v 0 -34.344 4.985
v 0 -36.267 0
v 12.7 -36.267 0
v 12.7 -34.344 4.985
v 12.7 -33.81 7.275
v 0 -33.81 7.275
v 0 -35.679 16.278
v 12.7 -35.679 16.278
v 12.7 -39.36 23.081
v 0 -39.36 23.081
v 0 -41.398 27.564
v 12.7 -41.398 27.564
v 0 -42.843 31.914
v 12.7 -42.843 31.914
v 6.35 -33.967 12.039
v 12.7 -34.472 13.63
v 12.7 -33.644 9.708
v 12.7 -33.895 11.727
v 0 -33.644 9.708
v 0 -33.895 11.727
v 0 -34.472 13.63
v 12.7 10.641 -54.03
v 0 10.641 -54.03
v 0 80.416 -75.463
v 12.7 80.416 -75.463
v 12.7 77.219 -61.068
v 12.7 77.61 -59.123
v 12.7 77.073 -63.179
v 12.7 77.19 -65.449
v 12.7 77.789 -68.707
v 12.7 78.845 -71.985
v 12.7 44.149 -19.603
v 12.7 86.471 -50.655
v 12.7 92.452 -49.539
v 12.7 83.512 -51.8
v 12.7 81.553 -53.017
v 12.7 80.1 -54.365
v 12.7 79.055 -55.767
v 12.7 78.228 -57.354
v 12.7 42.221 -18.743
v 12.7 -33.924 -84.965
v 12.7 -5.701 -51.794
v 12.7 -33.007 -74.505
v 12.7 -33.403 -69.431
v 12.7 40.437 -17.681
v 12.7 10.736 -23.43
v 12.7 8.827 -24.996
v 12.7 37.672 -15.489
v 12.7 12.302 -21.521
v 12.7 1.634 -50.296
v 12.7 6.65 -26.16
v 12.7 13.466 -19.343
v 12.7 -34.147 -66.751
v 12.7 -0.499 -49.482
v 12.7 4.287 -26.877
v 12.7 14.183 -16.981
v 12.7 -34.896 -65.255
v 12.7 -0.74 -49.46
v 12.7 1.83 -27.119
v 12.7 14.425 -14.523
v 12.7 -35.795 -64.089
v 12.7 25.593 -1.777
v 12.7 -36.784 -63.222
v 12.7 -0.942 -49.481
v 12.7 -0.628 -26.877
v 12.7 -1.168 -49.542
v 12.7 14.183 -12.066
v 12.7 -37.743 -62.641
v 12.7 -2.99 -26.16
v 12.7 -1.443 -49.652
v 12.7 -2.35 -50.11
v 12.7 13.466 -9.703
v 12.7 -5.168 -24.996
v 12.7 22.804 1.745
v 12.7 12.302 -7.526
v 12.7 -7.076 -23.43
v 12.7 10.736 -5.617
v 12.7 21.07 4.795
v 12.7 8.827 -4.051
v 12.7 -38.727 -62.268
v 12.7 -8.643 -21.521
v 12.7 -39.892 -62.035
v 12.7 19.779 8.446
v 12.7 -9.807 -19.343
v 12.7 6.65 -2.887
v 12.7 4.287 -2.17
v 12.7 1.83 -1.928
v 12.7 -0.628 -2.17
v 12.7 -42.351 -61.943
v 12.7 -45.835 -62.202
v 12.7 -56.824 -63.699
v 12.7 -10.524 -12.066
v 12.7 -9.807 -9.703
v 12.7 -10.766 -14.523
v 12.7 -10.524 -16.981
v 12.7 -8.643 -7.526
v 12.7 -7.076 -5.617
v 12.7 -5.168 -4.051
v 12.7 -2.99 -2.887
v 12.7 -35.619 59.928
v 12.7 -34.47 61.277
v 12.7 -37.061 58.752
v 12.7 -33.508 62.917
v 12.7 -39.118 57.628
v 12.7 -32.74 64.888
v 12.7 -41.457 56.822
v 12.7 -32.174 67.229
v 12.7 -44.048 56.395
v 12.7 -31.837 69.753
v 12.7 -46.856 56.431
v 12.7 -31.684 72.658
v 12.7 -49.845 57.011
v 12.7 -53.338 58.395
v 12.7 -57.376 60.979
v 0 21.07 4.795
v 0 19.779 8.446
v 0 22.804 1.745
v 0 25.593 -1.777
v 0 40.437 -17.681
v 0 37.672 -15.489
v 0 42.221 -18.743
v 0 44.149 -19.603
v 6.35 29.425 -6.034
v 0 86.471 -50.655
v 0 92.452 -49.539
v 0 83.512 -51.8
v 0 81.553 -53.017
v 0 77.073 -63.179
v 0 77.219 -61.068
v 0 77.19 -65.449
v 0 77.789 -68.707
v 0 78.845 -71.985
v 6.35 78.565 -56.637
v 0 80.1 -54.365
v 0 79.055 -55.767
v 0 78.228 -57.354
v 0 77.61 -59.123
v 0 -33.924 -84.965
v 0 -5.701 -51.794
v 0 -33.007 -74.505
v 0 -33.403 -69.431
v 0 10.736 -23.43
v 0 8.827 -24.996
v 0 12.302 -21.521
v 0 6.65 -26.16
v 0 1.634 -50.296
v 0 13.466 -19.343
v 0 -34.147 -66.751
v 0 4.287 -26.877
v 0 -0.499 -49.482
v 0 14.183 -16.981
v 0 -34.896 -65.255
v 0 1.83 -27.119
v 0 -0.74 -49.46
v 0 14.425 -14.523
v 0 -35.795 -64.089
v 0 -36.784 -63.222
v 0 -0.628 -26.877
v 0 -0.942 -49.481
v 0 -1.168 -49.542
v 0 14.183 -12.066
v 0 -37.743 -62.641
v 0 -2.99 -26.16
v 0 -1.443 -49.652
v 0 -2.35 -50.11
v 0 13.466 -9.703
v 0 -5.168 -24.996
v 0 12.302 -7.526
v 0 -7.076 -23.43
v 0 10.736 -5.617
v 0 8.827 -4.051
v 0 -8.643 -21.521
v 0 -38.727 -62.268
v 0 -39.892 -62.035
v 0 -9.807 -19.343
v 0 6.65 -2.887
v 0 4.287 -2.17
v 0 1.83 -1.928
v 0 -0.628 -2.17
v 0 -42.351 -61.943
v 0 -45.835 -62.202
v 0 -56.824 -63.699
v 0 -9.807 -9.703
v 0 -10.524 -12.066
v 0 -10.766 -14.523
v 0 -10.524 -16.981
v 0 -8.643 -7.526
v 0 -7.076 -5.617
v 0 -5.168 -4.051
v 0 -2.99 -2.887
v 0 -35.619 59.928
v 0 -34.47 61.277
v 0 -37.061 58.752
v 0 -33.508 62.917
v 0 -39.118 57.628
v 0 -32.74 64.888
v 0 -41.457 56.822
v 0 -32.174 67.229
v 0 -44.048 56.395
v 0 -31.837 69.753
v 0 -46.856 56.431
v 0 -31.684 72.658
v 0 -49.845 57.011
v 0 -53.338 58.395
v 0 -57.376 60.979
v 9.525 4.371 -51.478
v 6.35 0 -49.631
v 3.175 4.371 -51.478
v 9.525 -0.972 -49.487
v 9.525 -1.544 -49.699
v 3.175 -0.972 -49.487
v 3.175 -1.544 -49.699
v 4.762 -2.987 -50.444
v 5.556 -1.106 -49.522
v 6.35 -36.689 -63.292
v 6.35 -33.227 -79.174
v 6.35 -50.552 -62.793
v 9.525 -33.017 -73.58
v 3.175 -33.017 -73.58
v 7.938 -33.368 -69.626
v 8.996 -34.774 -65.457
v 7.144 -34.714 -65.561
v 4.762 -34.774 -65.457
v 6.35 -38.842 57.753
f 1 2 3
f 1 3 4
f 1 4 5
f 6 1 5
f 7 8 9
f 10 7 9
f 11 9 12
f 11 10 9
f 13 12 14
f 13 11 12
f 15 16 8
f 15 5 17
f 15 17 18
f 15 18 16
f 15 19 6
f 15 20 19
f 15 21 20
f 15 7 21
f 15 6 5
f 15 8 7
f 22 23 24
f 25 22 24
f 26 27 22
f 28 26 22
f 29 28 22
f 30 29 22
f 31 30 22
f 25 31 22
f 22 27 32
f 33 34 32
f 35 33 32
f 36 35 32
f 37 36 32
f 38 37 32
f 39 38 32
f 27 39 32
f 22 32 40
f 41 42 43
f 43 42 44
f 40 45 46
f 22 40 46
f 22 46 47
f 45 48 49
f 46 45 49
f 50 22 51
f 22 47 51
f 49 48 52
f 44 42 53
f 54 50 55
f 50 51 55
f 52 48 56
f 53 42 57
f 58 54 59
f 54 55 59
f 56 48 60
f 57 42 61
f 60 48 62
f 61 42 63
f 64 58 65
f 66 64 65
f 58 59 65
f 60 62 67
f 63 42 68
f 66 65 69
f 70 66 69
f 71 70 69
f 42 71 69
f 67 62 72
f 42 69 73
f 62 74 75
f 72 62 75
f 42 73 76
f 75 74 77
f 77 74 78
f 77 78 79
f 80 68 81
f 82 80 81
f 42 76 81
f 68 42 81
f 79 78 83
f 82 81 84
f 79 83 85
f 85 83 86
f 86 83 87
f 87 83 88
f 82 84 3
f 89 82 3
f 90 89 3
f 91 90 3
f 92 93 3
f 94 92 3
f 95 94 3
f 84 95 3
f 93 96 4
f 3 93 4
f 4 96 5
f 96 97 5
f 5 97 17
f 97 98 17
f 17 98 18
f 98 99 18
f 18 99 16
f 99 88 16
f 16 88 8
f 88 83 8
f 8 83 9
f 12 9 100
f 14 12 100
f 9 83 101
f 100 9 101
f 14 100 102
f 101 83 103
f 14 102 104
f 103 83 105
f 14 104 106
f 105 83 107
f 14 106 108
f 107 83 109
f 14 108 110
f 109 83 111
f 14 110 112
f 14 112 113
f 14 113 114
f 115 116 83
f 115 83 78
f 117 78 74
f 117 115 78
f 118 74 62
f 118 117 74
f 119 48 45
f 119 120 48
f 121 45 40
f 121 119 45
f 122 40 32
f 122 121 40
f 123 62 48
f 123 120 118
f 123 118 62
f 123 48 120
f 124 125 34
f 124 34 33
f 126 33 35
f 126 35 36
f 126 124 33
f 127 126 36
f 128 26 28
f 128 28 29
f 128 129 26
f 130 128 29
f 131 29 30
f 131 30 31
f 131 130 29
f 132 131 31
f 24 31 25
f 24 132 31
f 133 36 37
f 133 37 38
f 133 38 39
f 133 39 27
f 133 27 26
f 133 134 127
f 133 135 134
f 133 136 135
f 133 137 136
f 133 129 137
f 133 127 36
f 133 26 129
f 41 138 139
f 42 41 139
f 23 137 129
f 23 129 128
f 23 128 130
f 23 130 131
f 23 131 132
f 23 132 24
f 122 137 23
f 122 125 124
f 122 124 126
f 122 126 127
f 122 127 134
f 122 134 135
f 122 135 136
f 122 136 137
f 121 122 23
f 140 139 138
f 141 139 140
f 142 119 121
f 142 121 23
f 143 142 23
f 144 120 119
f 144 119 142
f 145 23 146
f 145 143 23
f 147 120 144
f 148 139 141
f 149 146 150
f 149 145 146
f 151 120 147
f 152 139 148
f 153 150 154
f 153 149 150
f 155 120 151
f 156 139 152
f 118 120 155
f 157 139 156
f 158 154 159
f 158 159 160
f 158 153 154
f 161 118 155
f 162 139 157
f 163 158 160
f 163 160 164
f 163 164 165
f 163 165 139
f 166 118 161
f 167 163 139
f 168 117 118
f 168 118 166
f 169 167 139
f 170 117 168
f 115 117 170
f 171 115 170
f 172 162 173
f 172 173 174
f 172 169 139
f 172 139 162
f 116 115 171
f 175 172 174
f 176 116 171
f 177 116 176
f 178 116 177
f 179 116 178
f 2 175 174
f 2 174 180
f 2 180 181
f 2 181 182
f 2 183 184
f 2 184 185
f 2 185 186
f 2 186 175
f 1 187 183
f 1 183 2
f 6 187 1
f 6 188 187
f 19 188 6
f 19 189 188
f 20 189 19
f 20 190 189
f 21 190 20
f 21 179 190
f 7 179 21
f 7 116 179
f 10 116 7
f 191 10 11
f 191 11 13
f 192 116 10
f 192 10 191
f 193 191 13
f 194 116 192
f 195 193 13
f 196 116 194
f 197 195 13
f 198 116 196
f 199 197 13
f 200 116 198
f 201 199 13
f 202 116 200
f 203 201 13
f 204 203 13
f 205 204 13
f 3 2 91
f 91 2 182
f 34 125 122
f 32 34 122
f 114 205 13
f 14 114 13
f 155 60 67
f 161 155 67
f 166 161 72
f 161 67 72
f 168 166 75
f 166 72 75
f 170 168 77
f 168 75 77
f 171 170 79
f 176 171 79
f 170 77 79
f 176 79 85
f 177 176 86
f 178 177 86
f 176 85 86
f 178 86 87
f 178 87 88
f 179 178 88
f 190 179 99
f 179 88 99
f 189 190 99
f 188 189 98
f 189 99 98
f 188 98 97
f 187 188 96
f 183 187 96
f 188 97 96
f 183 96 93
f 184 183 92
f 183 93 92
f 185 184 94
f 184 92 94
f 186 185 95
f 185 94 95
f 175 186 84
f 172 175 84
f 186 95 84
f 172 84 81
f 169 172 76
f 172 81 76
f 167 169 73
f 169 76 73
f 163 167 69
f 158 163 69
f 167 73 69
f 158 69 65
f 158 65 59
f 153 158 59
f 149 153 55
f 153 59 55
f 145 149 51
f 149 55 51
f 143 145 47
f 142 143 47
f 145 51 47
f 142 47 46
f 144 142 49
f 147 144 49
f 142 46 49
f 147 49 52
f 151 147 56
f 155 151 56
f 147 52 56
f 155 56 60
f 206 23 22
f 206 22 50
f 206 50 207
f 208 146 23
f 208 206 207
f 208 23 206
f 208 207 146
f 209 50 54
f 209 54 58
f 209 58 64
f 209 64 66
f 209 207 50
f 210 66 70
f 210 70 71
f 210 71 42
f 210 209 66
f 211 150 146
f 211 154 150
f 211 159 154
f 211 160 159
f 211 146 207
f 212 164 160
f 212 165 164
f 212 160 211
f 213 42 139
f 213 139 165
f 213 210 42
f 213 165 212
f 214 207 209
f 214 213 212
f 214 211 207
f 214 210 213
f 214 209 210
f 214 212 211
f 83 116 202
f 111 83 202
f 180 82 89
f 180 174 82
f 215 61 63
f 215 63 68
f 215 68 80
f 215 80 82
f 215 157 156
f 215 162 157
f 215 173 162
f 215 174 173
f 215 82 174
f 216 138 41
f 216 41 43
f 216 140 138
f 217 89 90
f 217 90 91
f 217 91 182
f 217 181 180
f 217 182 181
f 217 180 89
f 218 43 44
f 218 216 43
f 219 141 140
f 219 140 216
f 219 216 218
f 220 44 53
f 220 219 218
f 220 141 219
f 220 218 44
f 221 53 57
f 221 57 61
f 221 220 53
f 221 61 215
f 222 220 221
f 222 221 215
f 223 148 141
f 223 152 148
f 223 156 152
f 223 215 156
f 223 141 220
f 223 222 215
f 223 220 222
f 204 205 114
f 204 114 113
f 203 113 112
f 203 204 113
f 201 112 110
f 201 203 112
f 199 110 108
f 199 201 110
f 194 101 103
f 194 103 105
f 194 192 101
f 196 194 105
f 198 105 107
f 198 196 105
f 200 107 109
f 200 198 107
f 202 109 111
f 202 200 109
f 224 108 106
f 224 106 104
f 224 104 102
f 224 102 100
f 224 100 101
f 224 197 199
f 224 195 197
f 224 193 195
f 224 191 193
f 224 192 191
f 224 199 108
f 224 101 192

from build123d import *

# Parameters (mm, degrees)
F1_DEPTH = 12.7
F2_R     = 12.5952384753
F3_DEPTH = 12.7


with BuildPart() as f1:
    # F0 (on Right) → F1 (new body)
    with BuildSketch(Plane.YZ):
        with BuildLine():
            add(Edge.make_bspline(
                [(-57.3755726218, 60.9794743359), (-50.213151662, 55.4152866858), (-37.2366697029, 55.7418096569), (-31.8573741668, 63.5785382982), (-31.6838938743, 72.6575106382)],
                knots=[0, 0, 0, 0, 0.5161301104, 1, 1, 1, 1], degree=3))
            Line((-57.3755726218, 60.9794743359), (-42.8429059684, 31.9141410291))
            add(Edge.make_bspline(
                [(-36.2667675946, 0), (-34.2304695223, 4.5985213525), (-31.3995907567, 13.0121996142), (-40.343719866, 22.6597812459), (-42.8429059684, 31.9141410291)],
                knots=[0, 0, 0, 0, 0.4287022635, 1, 1, 1, 1], degree=3))
            Line((-36.2667675946, 0), (-56.8240570945, -63.699272458))
            add(Edge.make_bspline(
                [(-33.9242853224, -84.9647447467), (-31.6925561956, -70.080335482), (-35.9990572627, -60.9174321222), (-42.6189227408, -61.5948104869), (-56.8240570945, -63.699272458)],
                knots=[0, 0, 0, 0, 0.51017927, 1, 1, 1, 1], degree=3))
            Line((-33.9242853224, -84.9647447467), (-5.7011889294, -51.7937131226))
            add(Edge.make_bspline(
                [(10.6406565756, -54.0301650763), (6.3823924594, -52.4609805374), (-1.6627763206, -48.6585438271), (-0.9598822639, -49.5478302166), (-5.7011889294, -51.7937131226)],
                knots=[0, 0, 0, 0, 0.5787981071, 1, 1, 1, 1], degree=3))
            Line((10.6406565756, -54.0301650763), (80.4164707661, -75.4625424743))
            add(Edge.make_bspline(
                [(92.4523919821, -49.5390184224), (84.5183726601, -50.3969736232), (76.2899942249, -55.1051300096), (76.3544072931, -67.5799232364), (80.4164707661, -75.4625424743)],
                knots=[0, 0, 0, 0, 0.4758961852, 1, 1, 1, 1], degree=3))
            Line((92.4523919821, -49.5390184224), (44.148941397, -19.6030026067))
            add(Edge.make_bspline(
                [(19.77852609, 8.4459672519), (21.4932358048, 1.7455546836), (29.8932683418, -5.0282844876), (37.5500863975, -17.1425788423), (44.148941397, -19.6030026067)],
                knots=[0, 0, 0, 0, 0.4824482884, 1, 1, 1, 1], degree=3))
            Line((19.77852609, 8.4459672519), (-31.6838938743, 72.6575106382))
        make_face()
    extrude(amount=F1_DEPTH)

    # F2 (on face) → F3 (cut)
    with BuildSketch(Plane.YZ.offset(12.7)):
        with Locations((1.8296902999, -14.5234484226)):
            Circle(F2_R)
    extrude(amount=-F3_DEPTH, mode=Mode.SUBTRACT)


solid = f1.part
